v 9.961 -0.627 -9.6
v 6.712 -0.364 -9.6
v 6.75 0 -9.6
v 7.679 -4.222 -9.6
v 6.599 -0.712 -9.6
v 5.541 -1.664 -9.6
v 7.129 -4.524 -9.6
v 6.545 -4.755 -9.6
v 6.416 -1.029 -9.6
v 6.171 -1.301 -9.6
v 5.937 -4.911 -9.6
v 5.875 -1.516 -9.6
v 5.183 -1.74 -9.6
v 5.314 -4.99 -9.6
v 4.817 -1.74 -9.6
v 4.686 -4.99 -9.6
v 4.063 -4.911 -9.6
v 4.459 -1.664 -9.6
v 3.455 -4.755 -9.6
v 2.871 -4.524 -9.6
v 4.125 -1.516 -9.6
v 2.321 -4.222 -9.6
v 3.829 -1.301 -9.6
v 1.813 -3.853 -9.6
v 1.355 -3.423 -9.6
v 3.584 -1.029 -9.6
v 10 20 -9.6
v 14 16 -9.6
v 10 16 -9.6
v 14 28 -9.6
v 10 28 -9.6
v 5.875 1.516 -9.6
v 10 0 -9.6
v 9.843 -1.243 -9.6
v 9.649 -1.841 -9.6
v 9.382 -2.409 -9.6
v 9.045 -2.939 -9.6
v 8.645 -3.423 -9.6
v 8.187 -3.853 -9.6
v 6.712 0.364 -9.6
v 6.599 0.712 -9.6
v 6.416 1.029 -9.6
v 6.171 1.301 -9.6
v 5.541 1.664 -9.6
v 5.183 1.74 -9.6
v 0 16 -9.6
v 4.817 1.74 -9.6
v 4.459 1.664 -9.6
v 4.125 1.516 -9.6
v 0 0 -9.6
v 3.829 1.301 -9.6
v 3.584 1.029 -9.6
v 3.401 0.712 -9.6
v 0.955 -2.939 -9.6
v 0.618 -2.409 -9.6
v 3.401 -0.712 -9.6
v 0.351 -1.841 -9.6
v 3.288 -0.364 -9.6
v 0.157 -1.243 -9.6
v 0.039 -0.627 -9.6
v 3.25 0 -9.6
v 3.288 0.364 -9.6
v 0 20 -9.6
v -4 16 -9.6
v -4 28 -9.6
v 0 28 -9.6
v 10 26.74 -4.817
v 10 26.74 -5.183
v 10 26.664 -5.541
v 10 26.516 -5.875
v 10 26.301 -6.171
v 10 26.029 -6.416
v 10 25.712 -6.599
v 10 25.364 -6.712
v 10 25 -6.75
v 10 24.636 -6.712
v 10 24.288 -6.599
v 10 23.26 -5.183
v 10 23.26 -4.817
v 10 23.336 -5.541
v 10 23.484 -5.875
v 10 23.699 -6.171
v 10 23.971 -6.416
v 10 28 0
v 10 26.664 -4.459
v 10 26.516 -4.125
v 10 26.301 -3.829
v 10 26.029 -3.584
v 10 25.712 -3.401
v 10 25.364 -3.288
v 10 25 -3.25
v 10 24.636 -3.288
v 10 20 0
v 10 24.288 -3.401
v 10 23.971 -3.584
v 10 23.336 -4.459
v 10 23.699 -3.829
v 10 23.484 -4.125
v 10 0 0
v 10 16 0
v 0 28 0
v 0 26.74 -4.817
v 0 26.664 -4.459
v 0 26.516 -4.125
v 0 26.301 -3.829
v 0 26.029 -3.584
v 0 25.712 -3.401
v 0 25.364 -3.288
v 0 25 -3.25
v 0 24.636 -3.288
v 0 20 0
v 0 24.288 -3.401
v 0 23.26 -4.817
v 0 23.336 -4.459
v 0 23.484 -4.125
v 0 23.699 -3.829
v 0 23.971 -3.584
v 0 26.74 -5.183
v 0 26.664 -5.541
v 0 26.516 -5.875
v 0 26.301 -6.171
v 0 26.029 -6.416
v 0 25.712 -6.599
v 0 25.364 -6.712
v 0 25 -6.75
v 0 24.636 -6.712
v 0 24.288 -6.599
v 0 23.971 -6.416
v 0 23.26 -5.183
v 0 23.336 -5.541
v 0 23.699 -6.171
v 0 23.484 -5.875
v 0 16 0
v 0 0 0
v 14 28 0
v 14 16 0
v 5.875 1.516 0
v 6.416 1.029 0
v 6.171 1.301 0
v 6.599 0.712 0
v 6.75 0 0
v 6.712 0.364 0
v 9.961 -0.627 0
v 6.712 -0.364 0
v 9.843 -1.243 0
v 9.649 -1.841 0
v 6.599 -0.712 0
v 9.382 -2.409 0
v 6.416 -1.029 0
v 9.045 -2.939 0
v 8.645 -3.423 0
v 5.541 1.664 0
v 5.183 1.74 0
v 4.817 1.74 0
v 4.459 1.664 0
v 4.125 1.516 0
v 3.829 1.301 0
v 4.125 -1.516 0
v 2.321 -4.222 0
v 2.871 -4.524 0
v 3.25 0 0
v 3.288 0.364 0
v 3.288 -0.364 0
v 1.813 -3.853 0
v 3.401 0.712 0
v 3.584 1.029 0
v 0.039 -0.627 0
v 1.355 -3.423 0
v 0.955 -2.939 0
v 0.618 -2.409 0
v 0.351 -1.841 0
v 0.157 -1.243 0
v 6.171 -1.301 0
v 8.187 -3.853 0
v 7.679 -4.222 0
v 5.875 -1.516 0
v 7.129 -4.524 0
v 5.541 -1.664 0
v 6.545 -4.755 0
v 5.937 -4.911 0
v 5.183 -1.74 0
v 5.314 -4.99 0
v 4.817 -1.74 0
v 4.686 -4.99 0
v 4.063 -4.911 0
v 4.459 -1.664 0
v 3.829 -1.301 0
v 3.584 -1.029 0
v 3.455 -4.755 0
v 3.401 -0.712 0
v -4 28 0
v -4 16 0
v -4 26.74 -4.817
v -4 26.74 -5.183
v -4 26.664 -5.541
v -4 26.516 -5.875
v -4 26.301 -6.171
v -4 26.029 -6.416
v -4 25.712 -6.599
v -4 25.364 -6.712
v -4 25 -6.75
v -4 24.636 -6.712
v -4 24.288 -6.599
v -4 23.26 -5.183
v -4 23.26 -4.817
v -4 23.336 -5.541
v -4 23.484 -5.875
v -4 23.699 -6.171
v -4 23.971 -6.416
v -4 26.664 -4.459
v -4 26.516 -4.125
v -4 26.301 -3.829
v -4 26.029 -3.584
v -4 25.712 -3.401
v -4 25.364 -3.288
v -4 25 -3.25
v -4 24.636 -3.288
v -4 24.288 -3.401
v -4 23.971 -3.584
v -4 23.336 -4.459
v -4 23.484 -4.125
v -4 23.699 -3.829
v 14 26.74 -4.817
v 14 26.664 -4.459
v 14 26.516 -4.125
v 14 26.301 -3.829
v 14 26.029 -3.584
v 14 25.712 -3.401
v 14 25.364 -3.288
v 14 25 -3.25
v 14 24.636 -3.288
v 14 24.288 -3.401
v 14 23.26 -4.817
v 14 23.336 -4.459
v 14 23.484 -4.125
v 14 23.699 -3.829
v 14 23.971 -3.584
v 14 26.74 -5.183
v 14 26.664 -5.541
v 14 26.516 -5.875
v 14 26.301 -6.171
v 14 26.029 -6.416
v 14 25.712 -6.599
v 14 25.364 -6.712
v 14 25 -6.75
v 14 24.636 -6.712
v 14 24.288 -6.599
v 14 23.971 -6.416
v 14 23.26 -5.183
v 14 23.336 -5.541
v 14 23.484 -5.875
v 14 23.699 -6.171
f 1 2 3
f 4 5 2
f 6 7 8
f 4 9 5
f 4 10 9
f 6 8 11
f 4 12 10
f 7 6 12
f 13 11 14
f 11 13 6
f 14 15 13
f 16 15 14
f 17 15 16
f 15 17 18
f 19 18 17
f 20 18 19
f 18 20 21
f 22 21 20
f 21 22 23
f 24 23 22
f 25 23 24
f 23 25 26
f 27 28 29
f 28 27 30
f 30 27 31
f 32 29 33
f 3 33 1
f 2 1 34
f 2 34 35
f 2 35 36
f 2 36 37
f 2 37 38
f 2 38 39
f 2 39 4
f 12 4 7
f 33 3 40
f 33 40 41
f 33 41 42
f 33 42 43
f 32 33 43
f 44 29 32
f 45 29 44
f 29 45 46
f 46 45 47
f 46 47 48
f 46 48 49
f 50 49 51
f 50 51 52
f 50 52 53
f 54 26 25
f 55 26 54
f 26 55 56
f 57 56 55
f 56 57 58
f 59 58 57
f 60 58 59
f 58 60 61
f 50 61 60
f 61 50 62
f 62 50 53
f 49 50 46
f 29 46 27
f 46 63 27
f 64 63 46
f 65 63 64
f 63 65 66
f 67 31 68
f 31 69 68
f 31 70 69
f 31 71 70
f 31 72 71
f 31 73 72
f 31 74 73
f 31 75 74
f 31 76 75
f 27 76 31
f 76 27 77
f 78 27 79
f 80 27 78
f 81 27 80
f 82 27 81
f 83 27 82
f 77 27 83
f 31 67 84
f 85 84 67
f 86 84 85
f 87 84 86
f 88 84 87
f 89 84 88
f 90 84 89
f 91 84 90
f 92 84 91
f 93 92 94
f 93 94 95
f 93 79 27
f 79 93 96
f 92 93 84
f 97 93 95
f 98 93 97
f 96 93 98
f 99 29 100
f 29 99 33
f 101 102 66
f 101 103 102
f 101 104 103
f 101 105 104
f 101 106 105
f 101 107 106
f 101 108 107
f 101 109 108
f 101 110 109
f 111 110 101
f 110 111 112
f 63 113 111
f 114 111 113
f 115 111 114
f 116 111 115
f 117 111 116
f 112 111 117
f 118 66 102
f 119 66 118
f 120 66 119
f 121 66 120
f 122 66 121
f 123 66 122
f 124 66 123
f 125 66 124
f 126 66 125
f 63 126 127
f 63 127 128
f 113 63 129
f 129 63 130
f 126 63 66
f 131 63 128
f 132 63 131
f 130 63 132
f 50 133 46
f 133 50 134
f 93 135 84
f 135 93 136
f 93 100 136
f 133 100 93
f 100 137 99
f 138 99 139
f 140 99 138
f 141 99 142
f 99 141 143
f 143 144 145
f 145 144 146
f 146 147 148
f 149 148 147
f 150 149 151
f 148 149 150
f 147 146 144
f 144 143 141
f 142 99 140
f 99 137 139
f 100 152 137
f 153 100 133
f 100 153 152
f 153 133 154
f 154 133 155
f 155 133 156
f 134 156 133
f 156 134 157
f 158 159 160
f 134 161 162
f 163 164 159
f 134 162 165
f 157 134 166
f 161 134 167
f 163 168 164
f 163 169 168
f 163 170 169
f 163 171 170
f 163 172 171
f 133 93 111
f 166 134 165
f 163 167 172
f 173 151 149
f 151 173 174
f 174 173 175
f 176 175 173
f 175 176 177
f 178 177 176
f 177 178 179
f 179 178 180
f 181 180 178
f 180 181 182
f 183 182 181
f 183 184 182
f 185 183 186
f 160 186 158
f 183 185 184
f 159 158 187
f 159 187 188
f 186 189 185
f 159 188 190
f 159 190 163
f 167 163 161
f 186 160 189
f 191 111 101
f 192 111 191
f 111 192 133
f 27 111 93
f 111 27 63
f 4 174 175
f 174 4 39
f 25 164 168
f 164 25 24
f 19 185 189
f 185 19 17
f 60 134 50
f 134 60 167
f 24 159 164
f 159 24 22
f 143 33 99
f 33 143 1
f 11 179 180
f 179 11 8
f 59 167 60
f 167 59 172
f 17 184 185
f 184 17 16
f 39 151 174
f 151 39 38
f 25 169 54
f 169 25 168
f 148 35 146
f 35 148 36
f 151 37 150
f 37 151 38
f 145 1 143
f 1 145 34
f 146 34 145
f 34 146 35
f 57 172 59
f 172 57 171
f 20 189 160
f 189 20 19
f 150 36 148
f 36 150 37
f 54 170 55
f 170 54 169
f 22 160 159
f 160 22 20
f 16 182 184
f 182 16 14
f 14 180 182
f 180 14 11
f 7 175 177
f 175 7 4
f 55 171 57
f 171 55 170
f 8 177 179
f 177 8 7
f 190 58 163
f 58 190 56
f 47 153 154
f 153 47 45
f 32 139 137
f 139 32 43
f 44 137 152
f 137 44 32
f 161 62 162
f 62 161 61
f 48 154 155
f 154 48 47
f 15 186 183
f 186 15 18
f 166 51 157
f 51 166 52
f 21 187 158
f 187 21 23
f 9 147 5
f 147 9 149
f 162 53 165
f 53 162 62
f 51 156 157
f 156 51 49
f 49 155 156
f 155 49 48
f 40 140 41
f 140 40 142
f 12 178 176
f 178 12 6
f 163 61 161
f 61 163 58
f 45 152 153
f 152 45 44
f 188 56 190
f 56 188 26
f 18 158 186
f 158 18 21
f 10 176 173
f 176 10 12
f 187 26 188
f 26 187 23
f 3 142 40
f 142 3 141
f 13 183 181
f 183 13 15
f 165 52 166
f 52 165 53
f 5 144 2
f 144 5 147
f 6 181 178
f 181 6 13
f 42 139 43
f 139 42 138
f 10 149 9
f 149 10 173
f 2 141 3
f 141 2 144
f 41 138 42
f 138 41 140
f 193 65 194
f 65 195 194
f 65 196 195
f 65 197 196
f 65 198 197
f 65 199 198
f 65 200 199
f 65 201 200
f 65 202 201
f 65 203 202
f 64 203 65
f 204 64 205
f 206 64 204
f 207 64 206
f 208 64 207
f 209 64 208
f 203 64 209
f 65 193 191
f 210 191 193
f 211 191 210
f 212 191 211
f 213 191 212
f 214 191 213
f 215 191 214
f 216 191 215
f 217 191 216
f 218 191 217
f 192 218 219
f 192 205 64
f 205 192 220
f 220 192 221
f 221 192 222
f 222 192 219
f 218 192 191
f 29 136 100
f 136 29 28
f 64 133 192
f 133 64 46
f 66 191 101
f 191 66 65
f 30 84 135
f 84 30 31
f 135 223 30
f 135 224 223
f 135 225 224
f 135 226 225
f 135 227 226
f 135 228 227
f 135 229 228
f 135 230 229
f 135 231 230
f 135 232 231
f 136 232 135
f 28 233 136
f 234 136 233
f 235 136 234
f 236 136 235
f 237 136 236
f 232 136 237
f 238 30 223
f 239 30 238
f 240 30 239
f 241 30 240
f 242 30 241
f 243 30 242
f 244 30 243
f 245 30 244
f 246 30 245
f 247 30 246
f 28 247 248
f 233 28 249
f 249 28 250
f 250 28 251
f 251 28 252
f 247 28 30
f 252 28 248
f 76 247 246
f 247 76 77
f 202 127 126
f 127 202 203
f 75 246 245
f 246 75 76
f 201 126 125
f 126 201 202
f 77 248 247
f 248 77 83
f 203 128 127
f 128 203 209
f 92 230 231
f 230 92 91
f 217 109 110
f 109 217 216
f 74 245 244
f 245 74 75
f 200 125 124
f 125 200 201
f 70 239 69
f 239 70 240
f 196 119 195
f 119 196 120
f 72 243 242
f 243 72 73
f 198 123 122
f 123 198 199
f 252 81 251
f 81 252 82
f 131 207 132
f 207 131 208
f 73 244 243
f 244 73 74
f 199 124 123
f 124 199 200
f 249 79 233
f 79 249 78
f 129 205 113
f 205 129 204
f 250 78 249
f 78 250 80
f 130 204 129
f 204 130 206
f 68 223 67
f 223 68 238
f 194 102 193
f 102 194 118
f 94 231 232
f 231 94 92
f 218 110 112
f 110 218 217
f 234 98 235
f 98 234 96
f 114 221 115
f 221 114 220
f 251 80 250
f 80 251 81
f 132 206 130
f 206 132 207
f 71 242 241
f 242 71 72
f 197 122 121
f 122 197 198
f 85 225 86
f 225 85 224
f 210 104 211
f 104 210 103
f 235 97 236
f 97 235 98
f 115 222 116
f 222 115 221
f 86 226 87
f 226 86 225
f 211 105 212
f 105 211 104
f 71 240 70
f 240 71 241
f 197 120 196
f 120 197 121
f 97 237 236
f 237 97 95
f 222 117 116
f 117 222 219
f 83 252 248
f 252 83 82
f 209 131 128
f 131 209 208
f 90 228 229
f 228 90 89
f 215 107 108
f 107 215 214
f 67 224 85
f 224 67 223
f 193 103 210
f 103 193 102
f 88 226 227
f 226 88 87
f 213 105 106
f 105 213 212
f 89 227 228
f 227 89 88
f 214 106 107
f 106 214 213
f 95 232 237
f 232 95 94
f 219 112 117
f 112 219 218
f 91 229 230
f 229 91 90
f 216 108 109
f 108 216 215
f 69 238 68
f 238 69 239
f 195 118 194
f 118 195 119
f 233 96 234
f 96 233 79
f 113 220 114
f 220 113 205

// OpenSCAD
// Pi Camera Arm
// by Ming-Dao Chia
// Last update: 2/3/2017
// for the Borevitz Lab, Australian National University

// screw settings
screw_correction=.5;
base_screw_size=3;
screws=base_screw_size+screw_correction;

// model height
height=9.6;

module base_arm(){
    length=20;
    difference(){
    union(){
        cube([height,length,10]);
        rotate([0,90,0])
        translate([-5,0,0])
        cylinder(height,5,5,$fn=50);
    }
    translate([-1,0,5])
    rotate([0,90,0])
    cylinder(25,screws/2,screws/2,$fn=30);
}
}


// connects to main arm
module adapt_joint(){
    difference(){
        cube([18,height,12]);
        translate([4,-.5,-.5])
        cube([10,height+1,13]);
        rotate([90,0,90])
        translate([5,3,-10])
        cylinder(30,screws/2,screws/2,$fn=30);
    }
}

rotate([0,90,0])
union(){
base_arm();
rotate([90,90,0])
translate([-14,0,-28])
adapt_joint();
}
